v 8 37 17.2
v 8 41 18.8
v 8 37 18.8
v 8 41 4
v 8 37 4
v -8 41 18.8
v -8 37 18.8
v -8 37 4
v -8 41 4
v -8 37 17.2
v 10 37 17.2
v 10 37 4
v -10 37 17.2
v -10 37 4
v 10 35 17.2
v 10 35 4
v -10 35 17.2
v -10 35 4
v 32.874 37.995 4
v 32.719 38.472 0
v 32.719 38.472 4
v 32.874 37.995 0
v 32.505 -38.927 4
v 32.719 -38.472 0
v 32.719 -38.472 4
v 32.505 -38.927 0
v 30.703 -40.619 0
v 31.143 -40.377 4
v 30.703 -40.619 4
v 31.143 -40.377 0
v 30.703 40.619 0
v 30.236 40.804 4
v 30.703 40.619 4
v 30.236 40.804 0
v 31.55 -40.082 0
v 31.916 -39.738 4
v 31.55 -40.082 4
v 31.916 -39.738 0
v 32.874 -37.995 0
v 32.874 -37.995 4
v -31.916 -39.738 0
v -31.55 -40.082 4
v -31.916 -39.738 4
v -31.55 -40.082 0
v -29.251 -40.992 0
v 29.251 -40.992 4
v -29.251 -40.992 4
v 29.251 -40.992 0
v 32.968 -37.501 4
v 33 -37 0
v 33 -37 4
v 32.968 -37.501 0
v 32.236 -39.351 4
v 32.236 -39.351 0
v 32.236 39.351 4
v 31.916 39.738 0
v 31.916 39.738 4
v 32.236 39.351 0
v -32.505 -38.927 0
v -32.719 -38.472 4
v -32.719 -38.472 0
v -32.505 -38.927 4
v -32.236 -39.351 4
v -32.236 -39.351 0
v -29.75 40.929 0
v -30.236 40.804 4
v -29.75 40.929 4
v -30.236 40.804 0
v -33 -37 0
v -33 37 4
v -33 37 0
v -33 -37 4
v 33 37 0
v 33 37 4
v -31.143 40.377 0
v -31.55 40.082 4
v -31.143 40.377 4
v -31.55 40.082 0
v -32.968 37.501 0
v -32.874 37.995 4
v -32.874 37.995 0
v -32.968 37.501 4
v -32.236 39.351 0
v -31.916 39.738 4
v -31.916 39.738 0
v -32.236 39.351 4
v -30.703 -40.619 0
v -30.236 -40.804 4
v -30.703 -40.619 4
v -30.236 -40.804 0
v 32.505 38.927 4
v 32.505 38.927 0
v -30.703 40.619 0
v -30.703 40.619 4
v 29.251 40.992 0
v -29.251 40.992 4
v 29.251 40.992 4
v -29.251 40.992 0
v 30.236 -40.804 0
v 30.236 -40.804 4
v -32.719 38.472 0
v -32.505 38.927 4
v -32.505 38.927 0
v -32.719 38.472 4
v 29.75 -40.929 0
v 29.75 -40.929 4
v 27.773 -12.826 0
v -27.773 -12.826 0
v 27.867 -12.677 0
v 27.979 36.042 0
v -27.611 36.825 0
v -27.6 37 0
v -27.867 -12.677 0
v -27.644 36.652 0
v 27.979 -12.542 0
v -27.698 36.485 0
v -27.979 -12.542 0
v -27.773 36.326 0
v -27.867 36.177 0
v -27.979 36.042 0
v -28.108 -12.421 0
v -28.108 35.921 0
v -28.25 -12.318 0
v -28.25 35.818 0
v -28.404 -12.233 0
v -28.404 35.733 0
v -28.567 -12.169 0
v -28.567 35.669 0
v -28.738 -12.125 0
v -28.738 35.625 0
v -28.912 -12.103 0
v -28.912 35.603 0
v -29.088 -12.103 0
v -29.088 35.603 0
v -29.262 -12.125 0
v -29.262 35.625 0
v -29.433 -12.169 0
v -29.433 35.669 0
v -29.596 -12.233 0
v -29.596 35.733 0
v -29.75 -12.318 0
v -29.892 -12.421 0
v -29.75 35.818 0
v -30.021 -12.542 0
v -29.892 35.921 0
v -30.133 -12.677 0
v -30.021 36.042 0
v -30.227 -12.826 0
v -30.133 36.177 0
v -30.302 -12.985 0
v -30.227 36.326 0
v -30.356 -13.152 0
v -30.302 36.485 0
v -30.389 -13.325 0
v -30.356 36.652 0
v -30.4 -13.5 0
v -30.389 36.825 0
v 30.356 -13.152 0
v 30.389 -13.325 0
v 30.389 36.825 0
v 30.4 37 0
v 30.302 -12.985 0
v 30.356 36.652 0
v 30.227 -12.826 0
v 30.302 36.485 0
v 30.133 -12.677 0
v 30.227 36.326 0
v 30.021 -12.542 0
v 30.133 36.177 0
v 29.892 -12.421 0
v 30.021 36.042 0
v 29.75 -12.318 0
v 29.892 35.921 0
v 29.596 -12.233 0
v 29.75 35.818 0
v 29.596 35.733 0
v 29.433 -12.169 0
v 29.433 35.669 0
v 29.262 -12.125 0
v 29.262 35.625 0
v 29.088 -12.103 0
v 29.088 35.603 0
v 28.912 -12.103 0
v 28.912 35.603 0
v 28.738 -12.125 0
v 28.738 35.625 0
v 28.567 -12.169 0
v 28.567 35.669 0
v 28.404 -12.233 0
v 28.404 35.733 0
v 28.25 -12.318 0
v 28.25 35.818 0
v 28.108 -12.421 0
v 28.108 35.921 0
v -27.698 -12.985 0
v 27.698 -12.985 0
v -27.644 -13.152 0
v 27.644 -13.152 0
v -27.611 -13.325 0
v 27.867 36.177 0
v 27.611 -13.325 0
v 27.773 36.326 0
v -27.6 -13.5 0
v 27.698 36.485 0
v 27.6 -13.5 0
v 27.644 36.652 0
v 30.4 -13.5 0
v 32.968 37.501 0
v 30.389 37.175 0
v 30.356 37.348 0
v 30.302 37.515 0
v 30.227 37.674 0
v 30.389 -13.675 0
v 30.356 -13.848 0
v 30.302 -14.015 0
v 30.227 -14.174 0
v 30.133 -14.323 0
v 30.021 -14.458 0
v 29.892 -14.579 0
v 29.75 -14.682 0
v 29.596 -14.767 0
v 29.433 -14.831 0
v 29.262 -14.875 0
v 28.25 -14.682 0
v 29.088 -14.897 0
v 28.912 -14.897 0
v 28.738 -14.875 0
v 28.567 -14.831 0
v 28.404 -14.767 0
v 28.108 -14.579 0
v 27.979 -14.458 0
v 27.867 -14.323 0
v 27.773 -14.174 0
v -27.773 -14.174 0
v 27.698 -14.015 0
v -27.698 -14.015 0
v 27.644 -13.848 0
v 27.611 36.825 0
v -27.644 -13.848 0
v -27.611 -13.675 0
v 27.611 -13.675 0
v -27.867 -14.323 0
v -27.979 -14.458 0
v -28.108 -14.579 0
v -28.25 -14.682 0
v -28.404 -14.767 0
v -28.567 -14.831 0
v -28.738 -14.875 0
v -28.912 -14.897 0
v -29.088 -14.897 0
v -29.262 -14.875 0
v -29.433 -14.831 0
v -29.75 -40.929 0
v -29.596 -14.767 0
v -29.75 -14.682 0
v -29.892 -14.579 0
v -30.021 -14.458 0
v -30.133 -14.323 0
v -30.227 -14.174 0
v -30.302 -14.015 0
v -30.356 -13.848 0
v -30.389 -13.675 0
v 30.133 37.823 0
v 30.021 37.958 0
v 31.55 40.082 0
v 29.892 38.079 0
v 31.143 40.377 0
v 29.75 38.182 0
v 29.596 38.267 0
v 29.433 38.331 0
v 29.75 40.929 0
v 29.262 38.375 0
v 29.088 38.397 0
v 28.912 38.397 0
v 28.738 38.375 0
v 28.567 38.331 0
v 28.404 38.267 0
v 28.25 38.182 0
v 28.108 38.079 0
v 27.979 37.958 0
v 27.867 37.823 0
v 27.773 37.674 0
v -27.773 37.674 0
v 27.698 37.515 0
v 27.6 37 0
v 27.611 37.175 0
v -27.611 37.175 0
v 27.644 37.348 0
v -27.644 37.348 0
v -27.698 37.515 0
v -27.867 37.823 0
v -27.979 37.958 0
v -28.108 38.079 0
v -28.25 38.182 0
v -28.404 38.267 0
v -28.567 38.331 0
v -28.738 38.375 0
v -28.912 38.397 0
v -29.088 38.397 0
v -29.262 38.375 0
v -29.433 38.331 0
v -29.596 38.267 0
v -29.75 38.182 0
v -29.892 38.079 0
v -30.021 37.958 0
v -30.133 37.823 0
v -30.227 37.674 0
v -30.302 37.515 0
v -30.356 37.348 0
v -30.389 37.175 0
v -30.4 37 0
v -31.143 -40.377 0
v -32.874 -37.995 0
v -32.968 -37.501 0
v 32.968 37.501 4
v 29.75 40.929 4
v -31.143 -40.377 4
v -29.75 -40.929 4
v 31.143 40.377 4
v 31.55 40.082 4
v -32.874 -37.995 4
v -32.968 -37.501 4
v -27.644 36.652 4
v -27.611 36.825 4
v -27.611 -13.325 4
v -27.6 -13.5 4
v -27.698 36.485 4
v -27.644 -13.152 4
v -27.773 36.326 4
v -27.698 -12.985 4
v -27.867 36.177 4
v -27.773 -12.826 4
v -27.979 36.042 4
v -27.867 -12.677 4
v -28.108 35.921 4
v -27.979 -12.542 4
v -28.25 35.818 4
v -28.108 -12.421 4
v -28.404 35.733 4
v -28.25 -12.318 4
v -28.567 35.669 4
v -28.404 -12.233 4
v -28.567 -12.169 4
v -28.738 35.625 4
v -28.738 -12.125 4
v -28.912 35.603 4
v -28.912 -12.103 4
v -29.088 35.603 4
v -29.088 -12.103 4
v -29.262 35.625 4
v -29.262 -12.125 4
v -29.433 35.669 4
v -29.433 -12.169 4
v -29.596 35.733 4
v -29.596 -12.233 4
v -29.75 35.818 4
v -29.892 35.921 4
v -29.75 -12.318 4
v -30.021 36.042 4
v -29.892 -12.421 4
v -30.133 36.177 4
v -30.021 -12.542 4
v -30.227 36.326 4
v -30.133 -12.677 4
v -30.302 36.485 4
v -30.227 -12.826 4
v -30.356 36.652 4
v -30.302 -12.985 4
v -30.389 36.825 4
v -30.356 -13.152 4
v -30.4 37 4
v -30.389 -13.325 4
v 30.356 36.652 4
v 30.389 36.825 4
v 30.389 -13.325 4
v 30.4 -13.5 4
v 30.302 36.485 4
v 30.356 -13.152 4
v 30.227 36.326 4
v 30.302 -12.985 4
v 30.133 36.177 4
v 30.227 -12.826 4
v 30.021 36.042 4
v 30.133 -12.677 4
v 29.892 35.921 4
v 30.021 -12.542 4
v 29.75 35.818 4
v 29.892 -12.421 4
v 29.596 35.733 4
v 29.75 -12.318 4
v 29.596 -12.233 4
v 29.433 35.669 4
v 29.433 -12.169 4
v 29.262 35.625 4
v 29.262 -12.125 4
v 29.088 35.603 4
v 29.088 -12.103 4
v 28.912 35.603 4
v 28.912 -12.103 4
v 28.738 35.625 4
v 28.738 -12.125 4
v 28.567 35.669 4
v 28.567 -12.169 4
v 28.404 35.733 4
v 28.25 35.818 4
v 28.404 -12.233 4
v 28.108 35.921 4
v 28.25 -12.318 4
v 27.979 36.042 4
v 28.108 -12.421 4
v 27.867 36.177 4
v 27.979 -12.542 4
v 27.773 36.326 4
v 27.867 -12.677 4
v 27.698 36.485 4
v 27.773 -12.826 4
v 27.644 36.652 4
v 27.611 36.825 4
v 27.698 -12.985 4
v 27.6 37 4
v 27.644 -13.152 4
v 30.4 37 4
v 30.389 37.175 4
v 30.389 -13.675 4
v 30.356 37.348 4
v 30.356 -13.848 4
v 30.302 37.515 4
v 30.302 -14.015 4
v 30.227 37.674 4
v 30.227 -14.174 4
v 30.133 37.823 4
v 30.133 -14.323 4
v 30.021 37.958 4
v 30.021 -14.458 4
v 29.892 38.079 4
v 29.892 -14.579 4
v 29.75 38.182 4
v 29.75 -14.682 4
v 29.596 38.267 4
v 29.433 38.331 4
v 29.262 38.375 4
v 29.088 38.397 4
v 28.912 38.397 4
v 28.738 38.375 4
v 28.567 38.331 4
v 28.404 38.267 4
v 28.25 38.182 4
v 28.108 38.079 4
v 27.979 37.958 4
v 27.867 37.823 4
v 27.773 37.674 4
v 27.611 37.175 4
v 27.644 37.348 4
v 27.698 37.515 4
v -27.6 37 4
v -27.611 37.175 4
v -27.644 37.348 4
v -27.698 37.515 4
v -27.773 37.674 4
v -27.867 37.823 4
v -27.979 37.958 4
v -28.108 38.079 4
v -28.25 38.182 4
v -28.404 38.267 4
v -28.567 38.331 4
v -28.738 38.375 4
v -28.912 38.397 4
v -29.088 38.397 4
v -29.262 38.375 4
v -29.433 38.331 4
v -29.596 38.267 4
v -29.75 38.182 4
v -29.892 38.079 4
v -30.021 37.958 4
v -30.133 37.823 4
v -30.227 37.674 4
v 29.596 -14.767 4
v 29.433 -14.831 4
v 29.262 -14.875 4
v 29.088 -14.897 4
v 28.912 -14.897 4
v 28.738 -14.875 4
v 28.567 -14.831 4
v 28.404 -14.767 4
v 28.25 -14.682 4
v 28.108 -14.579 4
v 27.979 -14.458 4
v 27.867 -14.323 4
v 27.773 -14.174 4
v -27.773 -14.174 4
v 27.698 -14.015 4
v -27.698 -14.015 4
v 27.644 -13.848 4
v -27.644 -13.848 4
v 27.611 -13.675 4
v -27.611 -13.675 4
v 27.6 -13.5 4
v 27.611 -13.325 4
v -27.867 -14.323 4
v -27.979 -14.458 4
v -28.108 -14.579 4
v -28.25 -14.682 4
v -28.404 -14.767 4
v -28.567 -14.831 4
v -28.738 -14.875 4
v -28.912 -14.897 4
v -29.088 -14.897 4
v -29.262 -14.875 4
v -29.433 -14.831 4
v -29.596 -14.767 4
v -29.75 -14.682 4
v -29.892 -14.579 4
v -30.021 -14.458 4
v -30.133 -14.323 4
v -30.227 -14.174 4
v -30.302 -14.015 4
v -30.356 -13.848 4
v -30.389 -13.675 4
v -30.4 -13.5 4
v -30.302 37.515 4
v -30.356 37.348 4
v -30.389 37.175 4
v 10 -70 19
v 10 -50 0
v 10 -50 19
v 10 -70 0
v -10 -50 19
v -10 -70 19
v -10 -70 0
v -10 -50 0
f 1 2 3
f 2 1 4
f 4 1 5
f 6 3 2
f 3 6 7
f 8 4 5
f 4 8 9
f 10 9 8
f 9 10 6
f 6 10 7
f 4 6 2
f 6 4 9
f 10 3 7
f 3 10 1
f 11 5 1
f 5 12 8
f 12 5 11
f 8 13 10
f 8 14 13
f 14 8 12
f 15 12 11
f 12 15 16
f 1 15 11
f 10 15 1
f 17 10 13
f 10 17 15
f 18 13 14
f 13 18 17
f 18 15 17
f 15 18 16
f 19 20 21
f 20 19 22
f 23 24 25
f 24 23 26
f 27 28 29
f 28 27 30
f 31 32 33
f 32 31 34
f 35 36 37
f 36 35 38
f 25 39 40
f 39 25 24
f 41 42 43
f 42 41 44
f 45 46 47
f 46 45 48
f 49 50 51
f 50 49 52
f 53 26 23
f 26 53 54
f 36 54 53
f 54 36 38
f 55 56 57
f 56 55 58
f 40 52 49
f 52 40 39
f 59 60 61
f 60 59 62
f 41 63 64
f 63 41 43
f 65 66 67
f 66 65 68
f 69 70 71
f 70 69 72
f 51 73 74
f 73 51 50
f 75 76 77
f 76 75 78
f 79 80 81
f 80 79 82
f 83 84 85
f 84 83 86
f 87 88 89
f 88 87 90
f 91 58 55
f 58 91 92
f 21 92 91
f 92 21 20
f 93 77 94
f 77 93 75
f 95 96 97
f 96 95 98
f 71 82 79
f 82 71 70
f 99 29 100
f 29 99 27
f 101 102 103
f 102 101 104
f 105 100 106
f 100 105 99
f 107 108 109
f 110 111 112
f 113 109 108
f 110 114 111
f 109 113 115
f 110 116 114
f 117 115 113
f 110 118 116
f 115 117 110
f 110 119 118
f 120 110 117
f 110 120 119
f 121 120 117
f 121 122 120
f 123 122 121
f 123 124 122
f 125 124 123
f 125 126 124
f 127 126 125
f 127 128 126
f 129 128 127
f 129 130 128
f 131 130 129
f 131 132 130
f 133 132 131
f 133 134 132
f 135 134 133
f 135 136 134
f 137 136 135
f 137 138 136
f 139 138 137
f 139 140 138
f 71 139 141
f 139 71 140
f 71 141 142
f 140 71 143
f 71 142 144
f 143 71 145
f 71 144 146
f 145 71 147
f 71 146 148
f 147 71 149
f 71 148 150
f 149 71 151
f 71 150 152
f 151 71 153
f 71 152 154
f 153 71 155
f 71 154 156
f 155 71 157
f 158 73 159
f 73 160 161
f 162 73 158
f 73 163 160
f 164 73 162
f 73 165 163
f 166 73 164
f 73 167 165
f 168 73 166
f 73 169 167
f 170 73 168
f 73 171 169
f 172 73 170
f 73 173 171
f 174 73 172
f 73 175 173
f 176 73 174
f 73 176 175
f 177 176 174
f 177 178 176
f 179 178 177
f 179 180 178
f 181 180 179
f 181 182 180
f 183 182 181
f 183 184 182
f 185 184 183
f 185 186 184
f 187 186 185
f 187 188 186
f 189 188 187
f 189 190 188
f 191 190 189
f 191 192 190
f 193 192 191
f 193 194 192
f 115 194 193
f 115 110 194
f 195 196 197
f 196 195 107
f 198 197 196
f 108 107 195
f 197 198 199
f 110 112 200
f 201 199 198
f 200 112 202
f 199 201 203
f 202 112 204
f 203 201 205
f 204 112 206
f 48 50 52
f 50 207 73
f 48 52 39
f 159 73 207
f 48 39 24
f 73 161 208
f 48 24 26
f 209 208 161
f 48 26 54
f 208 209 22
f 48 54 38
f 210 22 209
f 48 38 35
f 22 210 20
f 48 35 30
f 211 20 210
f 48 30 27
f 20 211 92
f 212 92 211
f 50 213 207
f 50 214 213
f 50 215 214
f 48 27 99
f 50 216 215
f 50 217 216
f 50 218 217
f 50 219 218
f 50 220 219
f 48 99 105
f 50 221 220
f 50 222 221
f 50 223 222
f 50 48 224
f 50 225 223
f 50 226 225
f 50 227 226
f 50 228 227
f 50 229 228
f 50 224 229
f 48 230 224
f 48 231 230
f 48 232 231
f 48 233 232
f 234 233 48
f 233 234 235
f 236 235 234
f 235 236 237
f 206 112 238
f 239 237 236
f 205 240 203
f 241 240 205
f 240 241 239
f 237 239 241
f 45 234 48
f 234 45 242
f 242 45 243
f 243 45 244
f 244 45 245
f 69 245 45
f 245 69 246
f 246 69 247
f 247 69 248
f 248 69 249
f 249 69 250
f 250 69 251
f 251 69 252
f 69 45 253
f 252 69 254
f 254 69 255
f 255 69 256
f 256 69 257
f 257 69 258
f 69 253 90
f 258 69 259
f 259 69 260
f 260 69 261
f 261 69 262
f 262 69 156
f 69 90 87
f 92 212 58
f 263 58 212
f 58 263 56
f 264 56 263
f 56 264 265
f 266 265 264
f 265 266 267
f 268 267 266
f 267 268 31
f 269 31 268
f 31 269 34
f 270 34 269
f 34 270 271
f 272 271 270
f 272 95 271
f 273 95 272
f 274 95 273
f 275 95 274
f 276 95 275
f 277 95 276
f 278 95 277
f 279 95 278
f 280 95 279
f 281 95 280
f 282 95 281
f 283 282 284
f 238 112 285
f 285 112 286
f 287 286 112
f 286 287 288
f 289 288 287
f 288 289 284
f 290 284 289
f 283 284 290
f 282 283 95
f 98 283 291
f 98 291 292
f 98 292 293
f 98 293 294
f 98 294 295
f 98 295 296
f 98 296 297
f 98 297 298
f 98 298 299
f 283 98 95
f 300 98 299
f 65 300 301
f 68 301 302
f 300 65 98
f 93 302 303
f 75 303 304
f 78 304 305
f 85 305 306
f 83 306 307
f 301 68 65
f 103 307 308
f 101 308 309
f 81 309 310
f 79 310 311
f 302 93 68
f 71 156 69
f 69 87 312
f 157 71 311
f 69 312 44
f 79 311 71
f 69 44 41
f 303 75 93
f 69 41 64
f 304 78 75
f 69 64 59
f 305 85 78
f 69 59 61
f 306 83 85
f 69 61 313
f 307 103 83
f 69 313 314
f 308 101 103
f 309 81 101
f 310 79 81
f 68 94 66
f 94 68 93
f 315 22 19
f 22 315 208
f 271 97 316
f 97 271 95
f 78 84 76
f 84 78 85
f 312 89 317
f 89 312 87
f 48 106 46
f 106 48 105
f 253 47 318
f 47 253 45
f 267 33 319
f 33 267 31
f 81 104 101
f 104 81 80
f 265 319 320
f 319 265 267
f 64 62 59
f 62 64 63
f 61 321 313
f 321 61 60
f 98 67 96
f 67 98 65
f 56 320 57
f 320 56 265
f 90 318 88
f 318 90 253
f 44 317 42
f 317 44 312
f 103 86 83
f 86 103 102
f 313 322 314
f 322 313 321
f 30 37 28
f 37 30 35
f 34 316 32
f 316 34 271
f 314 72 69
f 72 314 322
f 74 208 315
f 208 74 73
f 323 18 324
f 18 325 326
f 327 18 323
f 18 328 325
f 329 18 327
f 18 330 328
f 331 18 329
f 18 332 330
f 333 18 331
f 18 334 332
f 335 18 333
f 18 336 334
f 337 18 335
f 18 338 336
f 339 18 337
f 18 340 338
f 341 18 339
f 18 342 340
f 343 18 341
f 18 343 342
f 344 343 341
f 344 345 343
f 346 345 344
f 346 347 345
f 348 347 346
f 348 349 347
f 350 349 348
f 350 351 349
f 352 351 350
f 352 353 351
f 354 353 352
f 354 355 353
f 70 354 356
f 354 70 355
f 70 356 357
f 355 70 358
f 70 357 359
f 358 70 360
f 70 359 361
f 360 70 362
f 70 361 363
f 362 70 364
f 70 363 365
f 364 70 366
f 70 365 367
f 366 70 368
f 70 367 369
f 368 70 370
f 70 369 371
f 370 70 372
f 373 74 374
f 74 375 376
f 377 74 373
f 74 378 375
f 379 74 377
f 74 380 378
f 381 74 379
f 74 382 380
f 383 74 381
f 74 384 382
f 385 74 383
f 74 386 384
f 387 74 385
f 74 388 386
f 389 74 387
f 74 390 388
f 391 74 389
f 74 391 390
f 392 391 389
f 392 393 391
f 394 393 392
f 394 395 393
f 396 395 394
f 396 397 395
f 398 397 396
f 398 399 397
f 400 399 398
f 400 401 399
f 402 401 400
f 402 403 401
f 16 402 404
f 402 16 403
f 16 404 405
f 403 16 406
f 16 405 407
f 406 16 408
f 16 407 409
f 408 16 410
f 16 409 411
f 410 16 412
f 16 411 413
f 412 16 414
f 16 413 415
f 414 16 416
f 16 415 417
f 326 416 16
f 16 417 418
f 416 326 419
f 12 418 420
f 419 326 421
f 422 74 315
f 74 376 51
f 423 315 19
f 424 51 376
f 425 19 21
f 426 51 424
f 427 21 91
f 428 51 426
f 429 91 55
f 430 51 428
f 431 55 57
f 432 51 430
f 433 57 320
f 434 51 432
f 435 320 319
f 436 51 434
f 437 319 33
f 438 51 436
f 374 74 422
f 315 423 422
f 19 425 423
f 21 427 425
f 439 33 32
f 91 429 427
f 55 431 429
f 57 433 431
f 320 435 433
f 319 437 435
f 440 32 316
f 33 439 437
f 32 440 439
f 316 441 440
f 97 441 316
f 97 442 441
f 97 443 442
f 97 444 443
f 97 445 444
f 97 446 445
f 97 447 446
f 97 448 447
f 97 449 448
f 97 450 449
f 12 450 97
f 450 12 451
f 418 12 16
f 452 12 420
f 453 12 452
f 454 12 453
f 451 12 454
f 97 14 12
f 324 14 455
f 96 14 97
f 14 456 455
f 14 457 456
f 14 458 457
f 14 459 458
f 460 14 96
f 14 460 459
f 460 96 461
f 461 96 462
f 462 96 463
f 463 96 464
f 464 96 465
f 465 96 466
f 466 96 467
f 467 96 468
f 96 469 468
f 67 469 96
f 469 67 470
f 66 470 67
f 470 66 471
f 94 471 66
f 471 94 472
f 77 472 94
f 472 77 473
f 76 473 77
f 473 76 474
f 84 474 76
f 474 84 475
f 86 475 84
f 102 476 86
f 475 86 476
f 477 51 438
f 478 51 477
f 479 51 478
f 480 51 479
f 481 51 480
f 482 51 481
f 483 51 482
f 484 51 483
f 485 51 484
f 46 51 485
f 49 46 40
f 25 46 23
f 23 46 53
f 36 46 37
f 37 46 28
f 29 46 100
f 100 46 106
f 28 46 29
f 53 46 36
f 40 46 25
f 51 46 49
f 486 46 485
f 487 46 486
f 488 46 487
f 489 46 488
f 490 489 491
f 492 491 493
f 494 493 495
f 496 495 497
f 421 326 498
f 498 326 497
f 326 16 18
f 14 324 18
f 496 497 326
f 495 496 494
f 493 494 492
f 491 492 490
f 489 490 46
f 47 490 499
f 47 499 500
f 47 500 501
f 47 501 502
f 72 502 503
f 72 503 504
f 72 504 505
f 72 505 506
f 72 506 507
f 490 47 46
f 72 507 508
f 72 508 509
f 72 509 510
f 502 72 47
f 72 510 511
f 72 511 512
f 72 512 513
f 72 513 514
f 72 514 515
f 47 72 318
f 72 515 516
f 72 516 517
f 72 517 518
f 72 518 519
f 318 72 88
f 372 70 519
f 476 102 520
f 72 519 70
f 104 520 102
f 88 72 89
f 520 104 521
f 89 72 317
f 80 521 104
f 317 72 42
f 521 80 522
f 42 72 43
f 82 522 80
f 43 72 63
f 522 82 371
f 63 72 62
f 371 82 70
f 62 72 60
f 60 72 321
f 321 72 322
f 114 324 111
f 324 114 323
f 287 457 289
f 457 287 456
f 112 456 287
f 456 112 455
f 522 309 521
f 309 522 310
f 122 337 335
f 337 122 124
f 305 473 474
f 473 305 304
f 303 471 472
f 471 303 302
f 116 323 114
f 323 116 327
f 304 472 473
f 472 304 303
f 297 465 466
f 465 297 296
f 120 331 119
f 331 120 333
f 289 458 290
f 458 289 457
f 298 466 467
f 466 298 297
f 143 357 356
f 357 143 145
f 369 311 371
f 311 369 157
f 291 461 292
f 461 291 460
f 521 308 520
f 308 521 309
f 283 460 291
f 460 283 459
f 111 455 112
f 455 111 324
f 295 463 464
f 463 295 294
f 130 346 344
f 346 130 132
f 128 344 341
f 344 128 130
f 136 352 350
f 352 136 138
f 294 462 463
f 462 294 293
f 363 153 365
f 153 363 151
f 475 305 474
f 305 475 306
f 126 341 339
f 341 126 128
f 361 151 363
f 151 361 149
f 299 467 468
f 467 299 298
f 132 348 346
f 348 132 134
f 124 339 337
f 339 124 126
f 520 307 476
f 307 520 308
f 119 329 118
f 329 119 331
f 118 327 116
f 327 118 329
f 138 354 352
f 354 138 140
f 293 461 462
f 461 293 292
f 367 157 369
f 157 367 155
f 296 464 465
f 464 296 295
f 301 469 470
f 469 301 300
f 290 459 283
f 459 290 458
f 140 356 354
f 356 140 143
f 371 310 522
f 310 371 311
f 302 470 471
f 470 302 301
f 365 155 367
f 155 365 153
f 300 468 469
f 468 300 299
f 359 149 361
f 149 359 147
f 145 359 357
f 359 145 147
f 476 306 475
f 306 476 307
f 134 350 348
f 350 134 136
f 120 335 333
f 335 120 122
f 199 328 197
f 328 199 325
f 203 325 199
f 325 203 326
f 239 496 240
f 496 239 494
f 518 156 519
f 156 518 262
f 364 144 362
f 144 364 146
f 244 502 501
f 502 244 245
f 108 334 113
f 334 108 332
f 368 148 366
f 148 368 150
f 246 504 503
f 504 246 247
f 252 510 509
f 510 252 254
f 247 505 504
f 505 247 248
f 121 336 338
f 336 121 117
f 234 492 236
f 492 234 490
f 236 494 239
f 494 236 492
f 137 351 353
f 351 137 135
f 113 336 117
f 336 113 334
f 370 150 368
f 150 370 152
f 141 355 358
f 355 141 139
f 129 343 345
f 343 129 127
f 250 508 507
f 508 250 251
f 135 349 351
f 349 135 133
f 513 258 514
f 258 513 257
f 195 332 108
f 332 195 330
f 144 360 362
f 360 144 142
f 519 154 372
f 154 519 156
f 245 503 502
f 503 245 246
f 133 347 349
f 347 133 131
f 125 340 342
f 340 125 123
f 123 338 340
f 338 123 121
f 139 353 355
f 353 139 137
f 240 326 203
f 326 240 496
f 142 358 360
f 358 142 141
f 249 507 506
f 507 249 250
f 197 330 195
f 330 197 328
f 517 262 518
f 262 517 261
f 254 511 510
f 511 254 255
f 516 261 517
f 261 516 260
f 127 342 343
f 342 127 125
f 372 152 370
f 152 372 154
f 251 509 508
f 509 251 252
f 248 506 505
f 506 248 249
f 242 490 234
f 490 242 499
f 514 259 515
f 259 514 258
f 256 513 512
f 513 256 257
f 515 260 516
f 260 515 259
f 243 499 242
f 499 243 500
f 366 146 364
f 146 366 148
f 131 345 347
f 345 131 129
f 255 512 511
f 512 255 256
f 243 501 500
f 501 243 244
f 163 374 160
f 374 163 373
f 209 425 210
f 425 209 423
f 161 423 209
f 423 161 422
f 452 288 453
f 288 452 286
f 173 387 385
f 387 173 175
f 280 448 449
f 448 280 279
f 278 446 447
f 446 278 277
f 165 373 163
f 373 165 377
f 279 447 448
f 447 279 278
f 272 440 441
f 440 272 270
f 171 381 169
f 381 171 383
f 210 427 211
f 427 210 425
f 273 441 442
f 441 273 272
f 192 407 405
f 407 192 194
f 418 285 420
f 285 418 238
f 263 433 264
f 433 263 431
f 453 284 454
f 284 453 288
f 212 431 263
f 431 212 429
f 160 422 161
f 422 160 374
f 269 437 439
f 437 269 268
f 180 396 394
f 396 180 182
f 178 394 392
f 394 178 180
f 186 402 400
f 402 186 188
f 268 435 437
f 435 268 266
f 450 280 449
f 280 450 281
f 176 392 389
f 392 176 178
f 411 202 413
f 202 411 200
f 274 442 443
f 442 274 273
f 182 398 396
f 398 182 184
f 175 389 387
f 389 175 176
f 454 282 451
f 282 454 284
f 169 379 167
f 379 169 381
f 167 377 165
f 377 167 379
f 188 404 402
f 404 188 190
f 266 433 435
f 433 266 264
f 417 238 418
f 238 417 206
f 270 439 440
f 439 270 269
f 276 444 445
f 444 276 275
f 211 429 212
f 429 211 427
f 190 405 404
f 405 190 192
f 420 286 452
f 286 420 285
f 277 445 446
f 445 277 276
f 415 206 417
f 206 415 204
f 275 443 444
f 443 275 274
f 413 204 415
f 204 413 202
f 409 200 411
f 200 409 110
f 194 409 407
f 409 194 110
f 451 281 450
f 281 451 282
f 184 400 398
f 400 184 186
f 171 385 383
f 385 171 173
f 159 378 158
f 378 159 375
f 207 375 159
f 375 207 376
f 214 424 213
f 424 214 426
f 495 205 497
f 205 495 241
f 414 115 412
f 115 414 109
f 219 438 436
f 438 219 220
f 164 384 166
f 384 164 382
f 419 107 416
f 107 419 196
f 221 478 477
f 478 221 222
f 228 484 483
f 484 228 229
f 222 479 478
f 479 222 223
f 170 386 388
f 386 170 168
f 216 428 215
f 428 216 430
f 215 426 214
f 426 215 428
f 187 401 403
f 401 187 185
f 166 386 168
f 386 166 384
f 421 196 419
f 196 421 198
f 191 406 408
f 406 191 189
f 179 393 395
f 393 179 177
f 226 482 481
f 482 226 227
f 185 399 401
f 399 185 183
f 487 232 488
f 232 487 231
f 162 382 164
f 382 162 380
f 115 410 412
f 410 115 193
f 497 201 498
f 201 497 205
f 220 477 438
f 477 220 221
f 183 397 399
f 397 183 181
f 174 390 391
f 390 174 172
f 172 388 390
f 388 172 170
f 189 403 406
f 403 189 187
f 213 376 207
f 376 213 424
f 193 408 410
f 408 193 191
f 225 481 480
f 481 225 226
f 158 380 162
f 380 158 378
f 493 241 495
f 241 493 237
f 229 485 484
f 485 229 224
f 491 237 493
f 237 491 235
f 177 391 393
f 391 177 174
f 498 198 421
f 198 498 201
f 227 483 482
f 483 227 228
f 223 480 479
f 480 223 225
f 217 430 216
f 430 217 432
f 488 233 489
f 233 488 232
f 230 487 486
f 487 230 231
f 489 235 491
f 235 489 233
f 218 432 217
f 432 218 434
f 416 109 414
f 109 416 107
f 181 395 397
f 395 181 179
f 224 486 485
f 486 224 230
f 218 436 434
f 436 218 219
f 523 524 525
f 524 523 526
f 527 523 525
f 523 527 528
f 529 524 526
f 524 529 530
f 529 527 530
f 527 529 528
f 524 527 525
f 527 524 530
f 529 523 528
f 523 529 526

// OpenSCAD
$fn = 50;

facewidth = 58;
faceheight = 60+14;
thickness = 4;
cornerrad = 4;

faceoffsety = -5;

switchdiam = 7.2;
leddiam = 5.5;
postheight = 12.75;

wallheight = 28+thickness;


*union() {
    face();
    walls();
}

cover();

translate([-10, -70, 0]) cube([20, 20, 19]);
//translate([0, 20.75+faceoffsety, 13/2+thickness/2]) cube([16, 41.5, 13], true);

module face() {
    translate([0, 0, thickness/2])
    difference() {
        union() {
            cube([facewidth, faceheight, thickness], true);
            
            for(i=[-1, 1])
                translate([i*14.2, 36.2+faceoffsety, thickness/2])
                    difference() {
                        cylinder(r=3, h=postheight, center=false);
                        cylinder(r=1, h=postheight+1, center=false);
                    }
        }
        translate([0, faceoffsety, 0]) { //face void
            cylinder(d=switchdiam, h=thickness*2, center=true);
            for(i=[-1, 1], j=[11.3, 11.3+11.7])
                translate([i*13.9, j, 0])
                    cylinder(d=leddiam, h=thickness*2, center=true);
        }
    }
}

module walls() {
    difference() {
        union() {
            difference() {
                hull() 
                    for(i=[-1, 1], j=[-1, 1])
                        translate([i*(facewidth/2), j*(faceheight/2), 0])
                            cylinder(h=wallheight, center=false, r=cornerrad);
                translate([0, 0, wallheight/2])
                    cube([facewidth, faceheight, wallheight+1], true);
                translate([0, faceheight/2+thickness/2, wallheight/2+thickness])
                    cube([16.5, thickness*2, wallheight], true);
            }
            translate([0, faceoffsety-thickness/2-6.5, wallheight/2])
                difference() {
                    cube([facewidth, thickness, wallheight], true);
                    translate([facewidth/2-6.5, 0, -wallheight/2+4.5+thickness])
                       cube([13, 9, 9], true);
                }
            for(i=[-1, 1], j=[faceheight/2, faceoffsety-thickness/2-6.5])
                translate([i*facewidth/2, j, wallheight/2])
                    cylinder(r=4, h=wallheight, center=true);
        }
        for(i=[-1, 1], j=[faceheight/2, faceoffsety-thickness/2-6.5])
            translate([i*facewidth/2, j, wallheight/2+10])
                cylinder(r=1, h=wallheight, center=true);
        }
}

module cover() {
    difference() {
        union() {
            hull() 
                for(i=[-1, 1], j=[-1, 1])
                    translate([i*(facewidth/2), j*(faceheight/2), 0])
                        cylinder(h=thickness, center=false, r=cornerrad);
            translate([0, faceheight/2+thickness/2, 0])
                plate();
        }
        for(i=[-1, 1], j=[faceheight/2, faceoffsety-thickness/2-6.5])
            translate([i*facewidth/2, j, 0])
                cylinder(r=1.4, h=wallheight, center=true);
    }
 }
 
 module plate(height=14.8) {
     translate([0, 0, height/2+thickness])
     union() {
        cube([16, thickness, height], true);
        translate([0, -thickness/2-1, -1.6])
            cube([20, 2, height], true);
     }
 }
